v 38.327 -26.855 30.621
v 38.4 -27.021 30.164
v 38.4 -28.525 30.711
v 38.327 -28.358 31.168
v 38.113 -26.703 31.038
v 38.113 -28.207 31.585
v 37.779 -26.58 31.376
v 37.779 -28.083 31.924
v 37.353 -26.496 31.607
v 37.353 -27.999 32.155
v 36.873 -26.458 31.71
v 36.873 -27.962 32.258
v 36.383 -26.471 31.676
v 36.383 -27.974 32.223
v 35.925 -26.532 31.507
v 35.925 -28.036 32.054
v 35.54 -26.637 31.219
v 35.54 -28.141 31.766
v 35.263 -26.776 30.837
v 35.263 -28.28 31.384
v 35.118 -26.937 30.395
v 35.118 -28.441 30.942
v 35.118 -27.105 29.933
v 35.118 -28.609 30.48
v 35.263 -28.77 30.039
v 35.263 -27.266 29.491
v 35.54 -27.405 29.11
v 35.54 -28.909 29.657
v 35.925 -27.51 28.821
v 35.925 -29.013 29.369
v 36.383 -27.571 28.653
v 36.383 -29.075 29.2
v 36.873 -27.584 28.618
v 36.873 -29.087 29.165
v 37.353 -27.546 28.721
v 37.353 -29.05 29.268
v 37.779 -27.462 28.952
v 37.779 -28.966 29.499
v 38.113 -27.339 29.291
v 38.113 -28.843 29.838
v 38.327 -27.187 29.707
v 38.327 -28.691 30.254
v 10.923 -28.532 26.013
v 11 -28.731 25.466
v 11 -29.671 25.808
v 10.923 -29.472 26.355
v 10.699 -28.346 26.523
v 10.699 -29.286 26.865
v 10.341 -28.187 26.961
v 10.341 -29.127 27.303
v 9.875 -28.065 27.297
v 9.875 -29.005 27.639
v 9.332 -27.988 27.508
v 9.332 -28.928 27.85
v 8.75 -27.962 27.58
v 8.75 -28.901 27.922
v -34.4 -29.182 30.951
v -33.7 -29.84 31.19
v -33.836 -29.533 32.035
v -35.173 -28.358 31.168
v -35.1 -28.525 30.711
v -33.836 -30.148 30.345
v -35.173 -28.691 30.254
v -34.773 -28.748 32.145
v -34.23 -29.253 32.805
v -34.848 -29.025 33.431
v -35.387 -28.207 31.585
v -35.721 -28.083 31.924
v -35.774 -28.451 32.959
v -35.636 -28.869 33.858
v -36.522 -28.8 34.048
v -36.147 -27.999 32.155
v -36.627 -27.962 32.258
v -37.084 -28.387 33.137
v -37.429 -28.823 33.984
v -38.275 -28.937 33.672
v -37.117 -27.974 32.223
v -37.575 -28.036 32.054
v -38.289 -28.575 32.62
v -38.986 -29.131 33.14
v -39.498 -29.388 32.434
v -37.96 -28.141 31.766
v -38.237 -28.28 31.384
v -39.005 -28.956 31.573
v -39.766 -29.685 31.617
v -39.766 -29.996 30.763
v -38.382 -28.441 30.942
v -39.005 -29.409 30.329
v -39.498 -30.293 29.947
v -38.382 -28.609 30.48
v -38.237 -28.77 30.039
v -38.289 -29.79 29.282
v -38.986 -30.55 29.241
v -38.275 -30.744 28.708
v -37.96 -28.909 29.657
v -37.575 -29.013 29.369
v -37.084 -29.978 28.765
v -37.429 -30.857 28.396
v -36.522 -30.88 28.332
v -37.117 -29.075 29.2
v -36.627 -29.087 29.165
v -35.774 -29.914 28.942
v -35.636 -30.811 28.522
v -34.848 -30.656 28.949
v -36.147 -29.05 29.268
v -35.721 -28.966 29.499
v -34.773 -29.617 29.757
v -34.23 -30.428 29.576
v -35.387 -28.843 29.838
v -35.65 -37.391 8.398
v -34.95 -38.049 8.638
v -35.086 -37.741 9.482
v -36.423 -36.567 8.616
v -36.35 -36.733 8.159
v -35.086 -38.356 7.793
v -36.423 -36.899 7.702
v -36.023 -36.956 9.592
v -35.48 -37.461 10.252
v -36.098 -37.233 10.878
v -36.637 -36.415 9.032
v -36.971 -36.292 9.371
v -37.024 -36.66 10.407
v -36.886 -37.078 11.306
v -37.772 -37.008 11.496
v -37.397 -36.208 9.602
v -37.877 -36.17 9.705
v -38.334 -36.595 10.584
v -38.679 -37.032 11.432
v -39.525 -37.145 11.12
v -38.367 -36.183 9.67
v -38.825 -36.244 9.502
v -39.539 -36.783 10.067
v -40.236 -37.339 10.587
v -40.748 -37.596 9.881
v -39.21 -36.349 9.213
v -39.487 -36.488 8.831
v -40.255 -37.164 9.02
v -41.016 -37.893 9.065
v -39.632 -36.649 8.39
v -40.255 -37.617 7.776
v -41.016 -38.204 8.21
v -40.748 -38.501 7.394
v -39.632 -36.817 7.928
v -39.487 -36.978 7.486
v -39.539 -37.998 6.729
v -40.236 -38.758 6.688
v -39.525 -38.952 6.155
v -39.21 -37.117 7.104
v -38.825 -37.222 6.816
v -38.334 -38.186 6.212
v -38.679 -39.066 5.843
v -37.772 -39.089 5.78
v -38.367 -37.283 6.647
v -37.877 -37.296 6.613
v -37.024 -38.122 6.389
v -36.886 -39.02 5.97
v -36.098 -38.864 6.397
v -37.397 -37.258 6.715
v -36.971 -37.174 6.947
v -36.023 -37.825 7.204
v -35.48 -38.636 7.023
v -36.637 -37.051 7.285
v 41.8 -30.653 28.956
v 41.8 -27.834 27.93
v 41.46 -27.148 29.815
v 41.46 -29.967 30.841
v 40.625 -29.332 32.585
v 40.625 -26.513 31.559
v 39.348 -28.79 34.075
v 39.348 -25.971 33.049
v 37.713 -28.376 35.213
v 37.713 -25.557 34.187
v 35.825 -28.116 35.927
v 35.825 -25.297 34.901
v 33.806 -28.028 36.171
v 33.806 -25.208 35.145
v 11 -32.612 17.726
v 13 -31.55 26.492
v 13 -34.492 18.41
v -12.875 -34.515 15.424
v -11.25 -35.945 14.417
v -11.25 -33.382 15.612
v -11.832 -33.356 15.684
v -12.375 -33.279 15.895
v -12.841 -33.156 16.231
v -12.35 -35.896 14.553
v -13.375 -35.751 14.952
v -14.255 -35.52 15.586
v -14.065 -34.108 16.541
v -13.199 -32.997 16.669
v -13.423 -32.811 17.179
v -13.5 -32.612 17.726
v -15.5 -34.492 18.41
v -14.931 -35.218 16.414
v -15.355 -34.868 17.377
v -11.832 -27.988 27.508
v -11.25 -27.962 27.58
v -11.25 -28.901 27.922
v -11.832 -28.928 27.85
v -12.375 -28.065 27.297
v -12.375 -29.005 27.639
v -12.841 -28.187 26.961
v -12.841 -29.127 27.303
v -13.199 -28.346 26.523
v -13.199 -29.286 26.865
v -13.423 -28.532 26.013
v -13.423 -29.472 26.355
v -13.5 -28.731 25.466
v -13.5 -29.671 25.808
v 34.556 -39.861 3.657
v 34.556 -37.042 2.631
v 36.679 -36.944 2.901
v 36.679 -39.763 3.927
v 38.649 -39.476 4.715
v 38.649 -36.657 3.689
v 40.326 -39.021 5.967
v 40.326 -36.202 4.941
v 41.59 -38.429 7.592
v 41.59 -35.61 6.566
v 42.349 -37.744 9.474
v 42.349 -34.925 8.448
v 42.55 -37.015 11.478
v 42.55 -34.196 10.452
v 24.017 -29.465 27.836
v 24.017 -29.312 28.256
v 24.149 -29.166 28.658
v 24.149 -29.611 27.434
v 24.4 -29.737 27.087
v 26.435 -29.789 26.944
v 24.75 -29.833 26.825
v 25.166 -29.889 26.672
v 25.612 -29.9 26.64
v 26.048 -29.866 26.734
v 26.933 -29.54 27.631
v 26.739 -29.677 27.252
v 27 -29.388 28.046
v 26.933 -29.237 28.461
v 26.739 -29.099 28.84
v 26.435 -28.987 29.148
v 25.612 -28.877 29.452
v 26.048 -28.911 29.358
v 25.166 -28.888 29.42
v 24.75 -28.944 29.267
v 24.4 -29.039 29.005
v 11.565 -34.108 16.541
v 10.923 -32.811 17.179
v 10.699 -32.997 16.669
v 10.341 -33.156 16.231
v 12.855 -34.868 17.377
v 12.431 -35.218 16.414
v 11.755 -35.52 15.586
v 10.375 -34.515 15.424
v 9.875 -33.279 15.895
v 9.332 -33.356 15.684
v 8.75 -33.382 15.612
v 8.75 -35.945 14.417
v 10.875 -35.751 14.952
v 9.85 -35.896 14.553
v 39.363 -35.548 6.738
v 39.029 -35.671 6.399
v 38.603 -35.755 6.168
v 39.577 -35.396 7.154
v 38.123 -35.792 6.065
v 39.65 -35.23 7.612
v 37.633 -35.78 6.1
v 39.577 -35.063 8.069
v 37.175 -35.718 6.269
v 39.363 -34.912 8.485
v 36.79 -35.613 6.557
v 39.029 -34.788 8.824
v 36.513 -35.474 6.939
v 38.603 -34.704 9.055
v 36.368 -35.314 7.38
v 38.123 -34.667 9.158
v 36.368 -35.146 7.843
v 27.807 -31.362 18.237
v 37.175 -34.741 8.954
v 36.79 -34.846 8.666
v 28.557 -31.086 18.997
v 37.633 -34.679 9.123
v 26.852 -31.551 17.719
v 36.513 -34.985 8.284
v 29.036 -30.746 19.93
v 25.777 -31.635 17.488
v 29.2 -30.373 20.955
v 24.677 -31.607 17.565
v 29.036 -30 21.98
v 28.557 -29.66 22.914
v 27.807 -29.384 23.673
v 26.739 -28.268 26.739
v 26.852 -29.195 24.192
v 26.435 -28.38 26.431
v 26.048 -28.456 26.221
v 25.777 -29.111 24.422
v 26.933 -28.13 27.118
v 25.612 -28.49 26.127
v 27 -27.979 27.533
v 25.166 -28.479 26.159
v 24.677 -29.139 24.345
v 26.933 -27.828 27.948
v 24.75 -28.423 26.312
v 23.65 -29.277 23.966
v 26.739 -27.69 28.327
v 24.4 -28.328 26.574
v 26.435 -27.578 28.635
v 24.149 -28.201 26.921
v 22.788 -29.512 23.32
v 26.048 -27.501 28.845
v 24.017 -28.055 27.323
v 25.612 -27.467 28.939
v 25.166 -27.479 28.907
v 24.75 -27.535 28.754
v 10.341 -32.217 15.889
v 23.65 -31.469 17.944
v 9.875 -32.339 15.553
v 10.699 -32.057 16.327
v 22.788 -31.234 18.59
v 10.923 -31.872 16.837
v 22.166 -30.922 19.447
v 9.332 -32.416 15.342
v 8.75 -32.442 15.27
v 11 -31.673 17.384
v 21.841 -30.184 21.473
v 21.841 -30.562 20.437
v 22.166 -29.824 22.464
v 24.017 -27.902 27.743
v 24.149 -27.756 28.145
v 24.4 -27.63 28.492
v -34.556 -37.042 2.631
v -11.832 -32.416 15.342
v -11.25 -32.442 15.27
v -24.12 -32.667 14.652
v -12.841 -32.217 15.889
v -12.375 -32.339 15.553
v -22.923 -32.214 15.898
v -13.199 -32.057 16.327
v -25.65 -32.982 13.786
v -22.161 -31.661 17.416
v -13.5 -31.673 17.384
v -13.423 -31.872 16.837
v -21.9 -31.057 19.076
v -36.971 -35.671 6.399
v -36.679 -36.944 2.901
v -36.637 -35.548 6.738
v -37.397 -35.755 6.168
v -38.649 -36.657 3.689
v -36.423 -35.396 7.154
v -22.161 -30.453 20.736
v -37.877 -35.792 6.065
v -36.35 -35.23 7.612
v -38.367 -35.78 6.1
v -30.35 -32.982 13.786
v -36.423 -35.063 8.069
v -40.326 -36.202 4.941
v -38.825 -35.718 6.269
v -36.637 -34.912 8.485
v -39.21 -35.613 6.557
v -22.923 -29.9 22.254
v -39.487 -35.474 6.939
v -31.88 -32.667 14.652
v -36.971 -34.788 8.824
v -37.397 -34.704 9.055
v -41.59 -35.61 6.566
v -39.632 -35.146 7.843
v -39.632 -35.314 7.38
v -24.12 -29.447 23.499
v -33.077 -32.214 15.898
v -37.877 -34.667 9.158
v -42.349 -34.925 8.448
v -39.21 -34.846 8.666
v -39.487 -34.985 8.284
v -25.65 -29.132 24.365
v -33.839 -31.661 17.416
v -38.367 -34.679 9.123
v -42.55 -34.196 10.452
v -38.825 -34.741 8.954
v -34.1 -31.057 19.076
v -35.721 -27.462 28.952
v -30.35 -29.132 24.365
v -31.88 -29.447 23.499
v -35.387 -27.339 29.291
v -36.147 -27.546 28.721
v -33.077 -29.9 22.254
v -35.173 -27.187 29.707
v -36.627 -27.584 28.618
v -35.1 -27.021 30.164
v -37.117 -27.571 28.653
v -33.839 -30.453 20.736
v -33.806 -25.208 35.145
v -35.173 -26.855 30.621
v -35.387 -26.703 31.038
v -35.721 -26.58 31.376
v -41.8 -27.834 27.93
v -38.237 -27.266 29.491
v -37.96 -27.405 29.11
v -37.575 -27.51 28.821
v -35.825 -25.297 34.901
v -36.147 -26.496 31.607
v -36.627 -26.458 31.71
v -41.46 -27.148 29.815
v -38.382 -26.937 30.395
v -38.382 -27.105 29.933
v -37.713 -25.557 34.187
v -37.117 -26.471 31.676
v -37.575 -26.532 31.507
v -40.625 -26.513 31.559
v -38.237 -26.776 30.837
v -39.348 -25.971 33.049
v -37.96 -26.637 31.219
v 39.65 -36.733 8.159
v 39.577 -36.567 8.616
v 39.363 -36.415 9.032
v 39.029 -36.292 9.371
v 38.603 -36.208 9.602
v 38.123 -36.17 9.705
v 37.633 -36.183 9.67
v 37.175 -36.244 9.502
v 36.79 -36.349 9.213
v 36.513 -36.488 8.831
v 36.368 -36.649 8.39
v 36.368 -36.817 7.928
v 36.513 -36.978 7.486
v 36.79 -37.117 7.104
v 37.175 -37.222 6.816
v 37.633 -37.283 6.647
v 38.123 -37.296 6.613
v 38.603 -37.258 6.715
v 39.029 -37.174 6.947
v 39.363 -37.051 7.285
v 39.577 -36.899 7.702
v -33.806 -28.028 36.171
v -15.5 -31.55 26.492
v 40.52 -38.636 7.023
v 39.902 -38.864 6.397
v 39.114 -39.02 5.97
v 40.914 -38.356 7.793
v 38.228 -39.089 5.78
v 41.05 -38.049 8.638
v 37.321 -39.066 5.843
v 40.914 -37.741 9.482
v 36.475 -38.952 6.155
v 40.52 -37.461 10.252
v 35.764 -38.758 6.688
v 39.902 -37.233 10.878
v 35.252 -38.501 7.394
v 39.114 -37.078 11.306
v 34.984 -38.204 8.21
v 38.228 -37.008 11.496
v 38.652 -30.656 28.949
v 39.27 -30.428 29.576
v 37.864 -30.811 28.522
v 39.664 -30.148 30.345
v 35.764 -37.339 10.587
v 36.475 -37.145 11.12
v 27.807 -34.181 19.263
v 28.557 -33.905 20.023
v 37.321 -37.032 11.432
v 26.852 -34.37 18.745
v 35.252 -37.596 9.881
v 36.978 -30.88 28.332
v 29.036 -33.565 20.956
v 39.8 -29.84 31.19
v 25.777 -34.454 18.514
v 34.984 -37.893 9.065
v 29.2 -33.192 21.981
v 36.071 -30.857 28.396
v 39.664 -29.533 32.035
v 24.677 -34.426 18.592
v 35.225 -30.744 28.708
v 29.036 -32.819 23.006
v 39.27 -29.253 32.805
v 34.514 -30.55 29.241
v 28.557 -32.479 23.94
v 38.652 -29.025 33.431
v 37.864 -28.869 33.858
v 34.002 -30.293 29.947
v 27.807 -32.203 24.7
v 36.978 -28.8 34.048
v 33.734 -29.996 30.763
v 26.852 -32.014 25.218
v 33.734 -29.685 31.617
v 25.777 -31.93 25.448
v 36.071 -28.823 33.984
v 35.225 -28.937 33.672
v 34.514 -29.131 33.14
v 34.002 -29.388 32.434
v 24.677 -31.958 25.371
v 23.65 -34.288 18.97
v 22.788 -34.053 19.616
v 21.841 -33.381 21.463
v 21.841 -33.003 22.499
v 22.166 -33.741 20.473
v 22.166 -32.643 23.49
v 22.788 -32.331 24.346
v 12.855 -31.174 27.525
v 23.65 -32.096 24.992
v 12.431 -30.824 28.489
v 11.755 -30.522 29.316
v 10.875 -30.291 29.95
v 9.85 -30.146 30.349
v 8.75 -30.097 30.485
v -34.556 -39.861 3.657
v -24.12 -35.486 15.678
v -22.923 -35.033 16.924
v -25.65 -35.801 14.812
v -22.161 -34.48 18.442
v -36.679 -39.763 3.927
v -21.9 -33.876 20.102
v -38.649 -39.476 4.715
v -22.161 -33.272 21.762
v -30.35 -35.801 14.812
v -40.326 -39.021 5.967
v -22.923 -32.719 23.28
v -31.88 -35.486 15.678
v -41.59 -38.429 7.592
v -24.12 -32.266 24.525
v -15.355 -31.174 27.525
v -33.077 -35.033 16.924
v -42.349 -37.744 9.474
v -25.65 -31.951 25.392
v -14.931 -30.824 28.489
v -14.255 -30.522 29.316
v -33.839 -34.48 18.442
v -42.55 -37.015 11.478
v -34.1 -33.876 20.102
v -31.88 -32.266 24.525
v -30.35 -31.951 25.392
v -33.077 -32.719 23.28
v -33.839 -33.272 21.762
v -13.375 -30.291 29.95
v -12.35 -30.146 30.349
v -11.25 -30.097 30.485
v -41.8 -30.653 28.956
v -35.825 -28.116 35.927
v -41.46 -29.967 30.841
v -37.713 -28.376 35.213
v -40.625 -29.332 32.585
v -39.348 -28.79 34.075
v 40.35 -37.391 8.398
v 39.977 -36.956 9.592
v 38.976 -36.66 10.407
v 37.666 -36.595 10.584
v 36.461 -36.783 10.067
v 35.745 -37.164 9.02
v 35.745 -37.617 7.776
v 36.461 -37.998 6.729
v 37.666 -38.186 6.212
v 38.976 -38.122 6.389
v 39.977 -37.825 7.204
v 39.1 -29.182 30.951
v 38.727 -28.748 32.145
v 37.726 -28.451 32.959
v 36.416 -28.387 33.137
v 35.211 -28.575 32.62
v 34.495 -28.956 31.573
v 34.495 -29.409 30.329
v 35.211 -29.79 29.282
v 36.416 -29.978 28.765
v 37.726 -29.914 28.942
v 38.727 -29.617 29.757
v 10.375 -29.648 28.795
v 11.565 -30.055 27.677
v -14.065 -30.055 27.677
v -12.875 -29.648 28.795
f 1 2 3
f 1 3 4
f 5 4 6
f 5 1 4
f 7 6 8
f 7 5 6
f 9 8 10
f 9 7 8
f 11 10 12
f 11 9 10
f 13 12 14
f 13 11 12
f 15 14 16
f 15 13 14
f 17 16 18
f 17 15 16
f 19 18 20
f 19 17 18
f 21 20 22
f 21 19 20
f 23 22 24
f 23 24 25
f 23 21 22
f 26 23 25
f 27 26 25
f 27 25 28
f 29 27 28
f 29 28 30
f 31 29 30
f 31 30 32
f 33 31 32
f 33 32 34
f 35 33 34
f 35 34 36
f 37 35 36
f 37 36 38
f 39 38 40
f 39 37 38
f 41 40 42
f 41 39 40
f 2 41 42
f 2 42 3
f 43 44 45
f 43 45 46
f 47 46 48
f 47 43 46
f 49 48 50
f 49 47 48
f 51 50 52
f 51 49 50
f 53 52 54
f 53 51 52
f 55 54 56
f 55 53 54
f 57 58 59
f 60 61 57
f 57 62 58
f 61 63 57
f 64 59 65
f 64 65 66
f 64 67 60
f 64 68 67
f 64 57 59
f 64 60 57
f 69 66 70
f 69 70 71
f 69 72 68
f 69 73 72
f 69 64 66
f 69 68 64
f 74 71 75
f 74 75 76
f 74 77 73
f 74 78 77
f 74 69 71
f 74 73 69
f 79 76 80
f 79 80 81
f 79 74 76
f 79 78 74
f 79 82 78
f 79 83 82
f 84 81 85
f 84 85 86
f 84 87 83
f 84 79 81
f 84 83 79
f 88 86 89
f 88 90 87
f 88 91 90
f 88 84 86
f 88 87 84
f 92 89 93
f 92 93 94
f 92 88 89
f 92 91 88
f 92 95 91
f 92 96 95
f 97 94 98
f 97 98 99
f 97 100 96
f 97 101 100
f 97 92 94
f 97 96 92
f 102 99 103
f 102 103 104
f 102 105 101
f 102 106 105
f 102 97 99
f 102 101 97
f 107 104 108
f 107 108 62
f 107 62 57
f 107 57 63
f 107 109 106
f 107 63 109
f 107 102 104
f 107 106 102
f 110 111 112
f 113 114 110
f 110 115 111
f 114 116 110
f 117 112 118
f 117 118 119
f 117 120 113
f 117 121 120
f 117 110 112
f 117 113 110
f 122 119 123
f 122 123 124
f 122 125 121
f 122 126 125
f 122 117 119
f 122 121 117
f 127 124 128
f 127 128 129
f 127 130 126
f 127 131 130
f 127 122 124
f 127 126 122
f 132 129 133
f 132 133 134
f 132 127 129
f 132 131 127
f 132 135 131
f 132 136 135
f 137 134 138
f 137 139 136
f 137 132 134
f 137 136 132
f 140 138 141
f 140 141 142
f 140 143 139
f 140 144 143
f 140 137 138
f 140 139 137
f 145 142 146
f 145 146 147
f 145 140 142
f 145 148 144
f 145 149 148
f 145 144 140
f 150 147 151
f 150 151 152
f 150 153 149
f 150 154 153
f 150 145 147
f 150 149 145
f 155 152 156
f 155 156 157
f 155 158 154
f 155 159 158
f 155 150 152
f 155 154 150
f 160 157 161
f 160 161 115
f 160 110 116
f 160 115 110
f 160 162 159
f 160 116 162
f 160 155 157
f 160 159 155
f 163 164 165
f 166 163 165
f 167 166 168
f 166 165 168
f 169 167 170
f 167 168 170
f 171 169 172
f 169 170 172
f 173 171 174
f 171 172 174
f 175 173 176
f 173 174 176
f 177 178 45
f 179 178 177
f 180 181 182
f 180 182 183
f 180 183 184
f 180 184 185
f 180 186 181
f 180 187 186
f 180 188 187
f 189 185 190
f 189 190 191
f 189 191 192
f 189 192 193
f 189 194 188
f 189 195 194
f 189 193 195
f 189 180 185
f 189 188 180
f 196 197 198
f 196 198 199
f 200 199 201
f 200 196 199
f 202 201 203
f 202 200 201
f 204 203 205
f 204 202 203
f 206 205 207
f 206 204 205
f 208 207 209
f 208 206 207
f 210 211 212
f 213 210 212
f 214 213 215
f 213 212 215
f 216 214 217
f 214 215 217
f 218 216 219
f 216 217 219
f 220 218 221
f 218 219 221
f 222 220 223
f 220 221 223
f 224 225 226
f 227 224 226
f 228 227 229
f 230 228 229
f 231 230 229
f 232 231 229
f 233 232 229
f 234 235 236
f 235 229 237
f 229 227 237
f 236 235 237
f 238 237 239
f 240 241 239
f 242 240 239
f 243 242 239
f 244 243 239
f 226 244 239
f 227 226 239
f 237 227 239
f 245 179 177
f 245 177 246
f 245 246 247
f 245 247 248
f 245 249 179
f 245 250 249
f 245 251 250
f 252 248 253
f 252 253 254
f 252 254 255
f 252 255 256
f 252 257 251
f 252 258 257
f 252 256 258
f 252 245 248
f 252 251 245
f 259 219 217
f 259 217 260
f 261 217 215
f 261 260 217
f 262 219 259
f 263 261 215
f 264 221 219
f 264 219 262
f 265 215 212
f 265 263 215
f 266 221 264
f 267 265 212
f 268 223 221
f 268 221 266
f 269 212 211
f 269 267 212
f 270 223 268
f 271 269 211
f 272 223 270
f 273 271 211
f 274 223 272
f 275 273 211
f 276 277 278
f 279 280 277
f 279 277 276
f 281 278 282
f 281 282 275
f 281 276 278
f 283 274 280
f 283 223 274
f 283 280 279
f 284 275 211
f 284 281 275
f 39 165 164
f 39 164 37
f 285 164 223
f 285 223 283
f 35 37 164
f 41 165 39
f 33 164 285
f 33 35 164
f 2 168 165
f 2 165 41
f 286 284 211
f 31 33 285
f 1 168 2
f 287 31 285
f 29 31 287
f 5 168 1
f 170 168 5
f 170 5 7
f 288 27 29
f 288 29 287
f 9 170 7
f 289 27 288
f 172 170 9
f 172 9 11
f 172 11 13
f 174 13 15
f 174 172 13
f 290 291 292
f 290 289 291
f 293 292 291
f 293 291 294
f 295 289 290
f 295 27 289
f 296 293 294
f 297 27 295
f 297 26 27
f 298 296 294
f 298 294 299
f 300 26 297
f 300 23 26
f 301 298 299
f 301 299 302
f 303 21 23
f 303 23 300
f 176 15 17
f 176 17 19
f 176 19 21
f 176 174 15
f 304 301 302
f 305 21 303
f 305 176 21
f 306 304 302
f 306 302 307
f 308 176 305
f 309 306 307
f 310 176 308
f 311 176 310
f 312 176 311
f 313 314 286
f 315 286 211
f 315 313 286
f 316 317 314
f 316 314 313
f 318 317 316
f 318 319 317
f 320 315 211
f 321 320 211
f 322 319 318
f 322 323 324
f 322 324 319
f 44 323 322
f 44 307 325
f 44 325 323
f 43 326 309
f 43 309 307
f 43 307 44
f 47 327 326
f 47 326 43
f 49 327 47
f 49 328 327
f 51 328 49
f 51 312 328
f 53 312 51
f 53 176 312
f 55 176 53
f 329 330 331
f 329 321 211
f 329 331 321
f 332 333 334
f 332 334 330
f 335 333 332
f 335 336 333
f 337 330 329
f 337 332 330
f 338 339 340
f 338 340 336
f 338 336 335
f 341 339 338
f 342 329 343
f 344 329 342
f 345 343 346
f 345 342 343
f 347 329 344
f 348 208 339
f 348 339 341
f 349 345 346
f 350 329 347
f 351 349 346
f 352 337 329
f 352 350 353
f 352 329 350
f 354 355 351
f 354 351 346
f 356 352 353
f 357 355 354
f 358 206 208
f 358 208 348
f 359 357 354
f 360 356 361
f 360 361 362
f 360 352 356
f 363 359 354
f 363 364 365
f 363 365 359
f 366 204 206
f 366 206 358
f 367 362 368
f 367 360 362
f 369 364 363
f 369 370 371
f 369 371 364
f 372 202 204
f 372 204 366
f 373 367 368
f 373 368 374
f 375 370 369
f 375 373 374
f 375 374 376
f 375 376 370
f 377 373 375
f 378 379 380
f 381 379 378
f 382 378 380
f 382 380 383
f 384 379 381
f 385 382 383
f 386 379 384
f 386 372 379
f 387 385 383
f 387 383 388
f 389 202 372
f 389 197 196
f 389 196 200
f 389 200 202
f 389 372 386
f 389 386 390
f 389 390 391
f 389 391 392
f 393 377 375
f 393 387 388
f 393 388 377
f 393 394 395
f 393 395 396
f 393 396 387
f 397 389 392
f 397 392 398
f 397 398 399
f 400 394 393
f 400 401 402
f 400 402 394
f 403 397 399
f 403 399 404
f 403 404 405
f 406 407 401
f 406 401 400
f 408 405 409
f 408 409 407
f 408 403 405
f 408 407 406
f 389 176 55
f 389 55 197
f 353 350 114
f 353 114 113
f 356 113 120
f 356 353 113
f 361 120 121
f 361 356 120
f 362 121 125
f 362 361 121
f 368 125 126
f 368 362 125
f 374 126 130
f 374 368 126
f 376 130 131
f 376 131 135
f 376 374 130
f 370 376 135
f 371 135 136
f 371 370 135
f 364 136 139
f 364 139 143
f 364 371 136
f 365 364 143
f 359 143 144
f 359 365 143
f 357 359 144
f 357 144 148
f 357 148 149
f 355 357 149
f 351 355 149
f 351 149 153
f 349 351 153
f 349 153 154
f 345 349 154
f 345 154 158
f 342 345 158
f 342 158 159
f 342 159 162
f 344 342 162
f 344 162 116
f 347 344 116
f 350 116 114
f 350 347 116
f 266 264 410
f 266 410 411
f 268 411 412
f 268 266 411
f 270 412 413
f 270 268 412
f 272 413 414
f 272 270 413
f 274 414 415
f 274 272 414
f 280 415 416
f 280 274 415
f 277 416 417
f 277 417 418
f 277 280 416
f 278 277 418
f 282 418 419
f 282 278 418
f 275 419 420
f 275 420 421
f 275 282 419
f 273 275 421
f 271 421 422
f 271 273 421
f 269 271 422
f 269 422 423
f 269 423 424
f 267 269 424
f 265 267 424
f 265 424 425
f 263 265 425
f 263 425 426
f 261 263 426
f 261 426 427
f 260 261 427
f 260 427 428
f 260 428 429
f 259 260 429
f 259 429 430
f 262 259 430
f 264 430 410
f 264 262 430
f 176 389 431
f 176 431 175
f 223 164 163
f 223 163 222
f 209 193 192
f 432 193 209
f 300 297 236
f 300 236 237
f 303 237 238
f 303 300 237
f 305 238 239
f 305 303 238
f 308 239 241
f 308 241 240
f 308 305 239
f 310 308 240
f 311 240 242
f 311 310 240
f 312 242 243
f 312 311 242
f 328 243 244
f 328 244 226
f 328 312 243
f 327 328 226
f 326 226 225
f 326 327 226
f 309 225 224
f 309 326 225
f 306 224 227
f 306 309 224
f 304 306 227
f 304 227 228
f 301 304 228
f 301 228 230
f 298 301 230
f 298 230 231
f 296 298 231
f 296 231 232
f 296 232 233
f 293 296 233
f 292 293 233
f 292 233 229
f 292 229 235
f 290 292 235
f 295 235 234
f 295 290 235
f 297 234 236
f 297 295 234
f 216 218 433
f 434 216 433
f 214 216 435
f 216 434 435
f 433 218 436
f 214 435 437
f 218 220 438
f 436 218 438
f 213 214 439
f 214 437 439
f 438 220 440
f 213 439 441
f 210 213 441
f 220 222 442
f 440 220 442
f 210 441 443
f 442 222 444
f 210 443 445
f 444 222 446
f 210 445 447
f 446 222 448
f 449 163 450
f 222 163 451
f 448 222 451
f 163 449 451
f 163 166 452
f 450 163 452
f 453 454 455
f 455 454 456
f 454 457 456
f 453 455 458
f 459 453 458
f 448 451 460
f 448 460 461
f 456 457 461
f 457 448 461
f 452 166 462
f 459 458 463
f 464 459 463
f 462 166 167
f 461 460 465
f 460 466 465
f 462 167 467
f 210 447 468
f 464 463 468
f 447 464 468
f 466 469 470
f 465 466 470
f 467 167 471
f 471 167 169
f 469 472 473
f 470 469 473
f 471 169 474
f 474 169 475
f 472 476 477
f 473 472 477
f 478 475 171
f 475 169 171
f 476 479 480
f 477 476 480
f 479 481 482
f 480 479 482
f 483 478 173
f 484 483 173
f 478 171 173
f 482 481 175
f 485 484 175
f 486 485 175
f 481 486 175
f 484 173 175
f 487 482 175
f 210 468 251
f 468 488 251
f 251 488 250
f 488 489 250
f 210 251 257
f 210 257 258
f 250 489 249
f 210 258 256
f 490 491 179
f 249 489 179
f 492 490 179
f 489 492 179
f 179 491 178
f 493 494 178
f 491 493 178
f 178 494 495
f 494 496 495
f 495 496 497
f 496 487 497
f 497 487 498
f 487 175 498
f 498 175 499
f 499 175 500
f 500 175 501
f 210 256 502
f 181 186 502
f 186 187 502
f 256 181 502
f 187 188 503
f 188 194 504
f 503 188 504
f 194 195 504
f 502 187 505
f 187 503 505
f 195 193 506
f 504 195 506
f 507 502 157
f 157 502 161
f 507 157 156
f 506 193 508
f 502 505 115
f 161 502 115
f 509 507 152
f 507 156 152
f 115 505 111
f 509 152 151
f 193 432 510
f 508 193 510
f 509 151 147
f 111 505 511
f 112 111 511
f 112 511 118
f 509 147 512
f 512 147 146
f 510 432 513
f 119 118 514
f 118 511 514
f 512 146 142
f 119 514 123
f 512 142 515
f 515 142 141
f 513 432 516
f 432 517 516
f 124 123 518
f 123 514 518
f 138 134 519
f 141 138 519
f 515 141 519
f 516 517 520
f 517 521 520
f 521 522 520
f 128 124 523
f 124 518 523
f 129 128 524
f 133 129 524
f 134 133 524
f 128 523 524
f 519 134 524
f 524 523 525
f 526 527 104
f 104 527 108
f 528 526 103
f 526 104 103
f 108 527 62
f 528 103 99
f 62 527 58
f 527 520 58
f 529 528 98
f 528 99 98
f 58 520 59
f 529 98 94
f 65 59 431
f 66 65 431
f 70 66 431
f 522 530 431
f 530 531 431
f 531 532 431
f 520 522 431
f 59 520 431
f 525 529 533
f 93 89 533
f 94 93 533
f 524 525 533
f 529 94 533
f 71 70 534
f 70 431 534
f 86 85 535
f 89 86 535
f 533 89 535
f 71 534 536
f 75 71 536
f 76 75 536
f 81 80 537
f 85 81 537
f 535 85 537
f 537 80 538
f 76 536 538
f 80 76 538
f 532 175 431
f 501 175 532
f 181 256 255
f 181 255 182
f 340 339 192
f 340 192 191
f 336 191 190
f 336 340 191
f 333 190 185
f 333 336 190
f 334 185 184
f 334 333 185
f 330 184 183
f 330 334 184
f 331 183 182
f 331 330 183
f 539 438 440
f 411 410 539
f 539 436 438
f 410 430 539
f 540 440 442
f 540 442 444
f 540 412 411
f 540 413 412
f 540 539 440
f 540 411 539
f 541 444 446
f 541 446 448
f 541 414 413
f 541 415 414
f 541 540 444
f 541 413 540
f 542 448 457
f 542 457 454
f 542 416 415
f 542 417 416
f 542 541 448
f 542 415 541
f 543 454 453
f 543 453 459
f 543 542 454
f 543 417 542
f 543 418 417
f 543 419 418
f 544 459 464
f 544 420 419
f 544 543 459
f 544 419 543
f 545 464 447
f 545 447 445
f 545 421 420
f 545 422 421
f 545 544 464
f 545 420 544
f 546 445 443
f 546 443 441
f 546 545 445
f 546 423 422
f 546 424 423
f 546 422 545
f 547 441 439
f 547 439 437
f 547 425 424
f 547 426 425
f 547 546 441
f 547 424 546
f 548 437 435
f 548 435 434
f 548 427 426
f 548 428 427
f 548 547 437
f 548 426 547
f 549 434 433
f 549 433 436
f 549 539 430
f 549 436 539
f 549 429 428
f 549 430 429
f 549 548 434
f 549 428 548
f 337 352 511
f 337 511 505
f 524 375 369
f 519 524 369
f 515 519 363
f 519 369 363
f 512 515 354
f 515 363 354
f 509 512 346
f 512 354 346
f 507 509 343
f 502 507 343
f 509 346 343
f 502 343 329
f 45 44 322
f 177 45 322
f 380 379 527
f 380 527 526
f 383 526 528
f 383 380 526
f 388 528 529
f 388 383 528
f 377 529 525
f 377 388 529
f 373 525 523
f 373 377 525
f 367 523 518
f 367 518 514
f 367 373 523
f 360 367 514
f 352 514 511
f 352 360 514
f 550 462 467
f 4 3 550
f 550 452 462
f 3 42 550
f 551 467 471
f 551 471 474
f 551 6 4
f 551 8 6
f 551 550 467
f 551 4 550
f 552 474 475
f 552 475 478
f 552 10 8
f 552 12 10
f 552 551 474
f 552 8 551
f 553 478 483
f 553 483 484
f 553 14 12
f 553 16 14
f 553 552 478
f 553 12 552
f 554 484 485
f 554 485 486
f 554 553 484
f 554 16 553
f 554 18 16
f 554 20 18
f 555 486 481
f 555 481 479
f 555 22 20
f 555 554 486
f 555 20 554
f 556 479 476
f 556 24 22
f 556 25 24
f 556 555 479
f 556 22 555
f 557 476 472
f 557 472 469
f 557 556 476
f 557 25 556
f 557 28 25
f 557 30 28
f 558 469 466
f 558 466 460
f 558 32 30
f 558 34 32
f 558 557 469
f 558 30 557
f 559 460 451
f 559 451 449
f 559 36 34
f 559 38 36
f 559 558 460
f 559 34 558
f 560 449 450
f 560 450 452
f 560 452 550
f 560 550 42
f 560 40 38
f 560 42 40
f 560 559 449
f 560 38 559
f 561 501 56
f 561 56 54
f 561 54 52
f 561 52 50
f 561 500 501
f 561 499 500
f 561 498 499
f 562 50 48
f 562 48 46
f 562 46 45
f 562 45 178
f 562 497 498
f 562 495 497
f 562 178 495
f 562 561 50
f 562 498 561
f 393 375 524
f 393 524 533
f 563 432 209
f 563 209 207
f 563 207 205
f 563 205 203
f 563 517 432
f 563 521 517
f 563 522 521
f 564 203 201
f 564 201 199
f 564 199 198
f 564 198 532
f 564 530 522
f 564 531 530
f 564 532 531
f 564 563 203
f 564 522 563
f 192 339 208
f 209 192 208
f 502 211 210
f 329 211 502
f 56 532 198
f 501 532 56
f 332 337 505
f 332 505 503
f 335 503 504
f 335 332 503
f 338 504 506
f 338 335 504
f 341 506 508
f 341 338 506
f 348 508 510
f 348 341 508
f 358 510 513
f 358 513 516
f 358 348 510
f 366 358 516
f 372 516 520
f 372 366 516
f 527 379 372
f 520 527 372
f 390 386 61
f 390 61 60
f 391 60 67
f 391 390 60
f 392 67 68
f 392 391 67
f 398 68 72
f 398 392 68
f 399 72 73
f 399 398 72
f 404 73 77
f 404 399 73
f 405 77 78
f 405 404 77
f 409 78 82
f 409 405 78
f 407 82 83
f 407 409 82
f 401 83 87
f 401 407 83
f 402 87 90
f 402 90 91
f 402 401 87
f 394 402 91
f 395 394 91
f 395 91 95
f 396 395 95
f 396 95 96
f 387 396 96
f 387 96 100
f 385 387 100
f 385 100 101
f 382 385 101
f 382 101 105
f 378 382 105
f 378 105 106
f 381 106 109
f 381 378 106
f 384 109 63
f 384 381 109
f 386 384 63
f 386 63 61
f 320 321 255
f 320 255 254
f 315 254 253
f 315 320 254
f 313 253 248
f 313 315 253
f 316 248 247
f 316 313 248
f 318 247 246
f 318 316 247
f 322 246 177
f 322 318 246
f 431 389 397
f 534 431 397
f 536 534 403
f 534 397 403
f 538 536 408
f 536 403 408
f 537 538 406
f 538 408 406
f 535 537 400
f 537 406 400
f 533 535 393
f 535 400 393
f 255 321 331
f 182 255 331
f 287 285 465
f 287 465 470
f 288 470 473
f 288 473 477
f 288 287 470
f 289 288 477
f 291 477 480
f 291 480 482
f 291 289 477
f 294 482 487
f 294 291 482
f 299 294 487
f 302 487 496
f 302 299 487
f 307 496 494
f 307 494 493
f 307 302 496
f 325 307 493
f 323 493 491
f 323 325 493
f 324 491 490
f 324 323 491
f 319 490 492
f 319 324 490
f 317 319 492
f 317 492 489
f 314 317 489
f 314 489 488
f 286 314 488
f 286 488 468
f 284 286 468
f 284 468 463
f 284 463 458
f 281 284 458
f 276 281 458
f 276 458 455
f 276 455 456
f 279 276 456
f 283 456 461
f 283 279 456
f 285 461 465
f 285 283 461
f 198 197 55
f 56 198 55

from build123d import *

# Parameters (mm, degrees)
SKETCH033_R             = 1.65
SKETCH033_R_2           = 3.7
PAD001_DEPTH            = 3
CHAMFER001_SIZE         = 2
CHAMFER002_SIZE         = 1.4
SKETCH035_R             = 1.5
POCKET009_DEPTH         = 1.5
BODY005_PLACEMENT_ANGLE = 340


with BuildPart() as part:
    # Sketch033 → Pad001 (new body)
    with BuildSketch(Plane.XZ):
        with BuildLine():
            Line((-33.806498, 37.4), (33.806497, 37.4))
            ThreePointArc((41.8, 29.722351), (39.348211, 35.169697), (33.806497, 37.4))
            Line((41.8, 29.722351), (42.55, 11.122345))
            ThreePointArc((34.556497, 2.8), (40.326192, 5.258284), (42.55, 11.122345))
            Line((34.556497, 2.8), (-34.556497, 2.8))
            ThreePointArc((-42.55, 11.122345), (-40.326192, 5.258284), (-34.556497, 2.8))
            Line((-42.55, 11.122345), (-41.8, 29.722351))
            ThreePointArc((-33.806498, 37.4), (-39.348211, 35.169697), (-41.8, 29.722351))
        make_face()
        with Locations((-36.75, 32.1)):
            Circle(SKETCH033_R, mode=Mode.SUBTRACT)
        with Locations((36.75, 32.1)):
            Circle(SKETCH033_R, mode=Mode.SUBTRACT)
        with Locations((-38, 8.1)):
            Circle(SKETCH033_R, mode=Mode.SUBTRACT)
        with Locations((38, 8.1)):
            Circle(SKETCH033_R, mode=Mode.SUBTRACT)
        with Locations((25.5, 22.3)):
            Circle(SKETCH033_R_2, mode=Mode.SUBTRACT)
        with BuildLine():
            Line((-11.25, 29.35), (8.75, 29.35))
            ThreePointArc((11, 27.1), (10.34099, 28.69099), (8.75, 29.35))
            Line((11, 27.1), (11, 18.5))
            ThreePointArc((8.75, 16.25), (10.34099, 16.90901), (11, 18.5))
            Line((8.75, 16.25), (-11.25, 16.25))
            ThreePointArc((-13.5, 18.5), (-12.84099, 16.90901), (-11.25, 16.25))
            Line((-13.5, 18.5), (-13.5, 27.1))
            ThreePointArc((-11.25, 29.35), (-12.84099, 28.69099), (-13.5, 27.1))
        make_face(mode=Mode.SUBTRACT)
        with BuildLine():
            Line((-30.35, 25.929165), (-25.65, 25.929165))
            ThreePointArc((-25.65, 14.670835), (-21.9, 20.3), (-25.65, 25.929165))
            Line((-30.35, 14.670835), (-25.65, 14.670835))
            ThreePointArc((-30.35, 25.929165), (-34.1, 20.3), (-30.35, 14.670835))
        make_face(mode=Mode.SUBTRACT)
    extrude(amount=PAD001_DEPTH)

    # Chamfer001
    chamfer001_edges = [part.edges().sort_by_distance(p)[0] for p in [
        (-1.25, -3, 29.35),
    ]]
    chamfer(chamfer001_edges, length=CHAMFER001_SIZE)

    # Chamfer002
    chamfer002_edges = [part.edges().sort_by_distance(p)[0] for p in [
        (-38.4, -3, 32.1),
        (-39.65, -3, 8.1),
        (35.1, -3, 32.1),
        (36.35, -3, 8.1),
    ]]
    chamfer(chamfer002_edges, length=CHAMFER002_SIZE)

    # Sketch035 → Pocket009 (cut)
    with BuildSketch(Plane.XZ):
        with Locations((25.5, 29.3)):
            Circle(SKETCH035_R)
    extrude(amount=POCKET009_DEPTH, mode=Mode.SUBTRACT)


with BuildPart() as part_1:
    # Body005 placement: moved
    add(part.part.moved(Location((0, -38, 0))).rotate(Axis((0, -38, 0), (1, 0, 0)), BODY005_PLACEMENT_ANGLE))


solid = part_1.part
